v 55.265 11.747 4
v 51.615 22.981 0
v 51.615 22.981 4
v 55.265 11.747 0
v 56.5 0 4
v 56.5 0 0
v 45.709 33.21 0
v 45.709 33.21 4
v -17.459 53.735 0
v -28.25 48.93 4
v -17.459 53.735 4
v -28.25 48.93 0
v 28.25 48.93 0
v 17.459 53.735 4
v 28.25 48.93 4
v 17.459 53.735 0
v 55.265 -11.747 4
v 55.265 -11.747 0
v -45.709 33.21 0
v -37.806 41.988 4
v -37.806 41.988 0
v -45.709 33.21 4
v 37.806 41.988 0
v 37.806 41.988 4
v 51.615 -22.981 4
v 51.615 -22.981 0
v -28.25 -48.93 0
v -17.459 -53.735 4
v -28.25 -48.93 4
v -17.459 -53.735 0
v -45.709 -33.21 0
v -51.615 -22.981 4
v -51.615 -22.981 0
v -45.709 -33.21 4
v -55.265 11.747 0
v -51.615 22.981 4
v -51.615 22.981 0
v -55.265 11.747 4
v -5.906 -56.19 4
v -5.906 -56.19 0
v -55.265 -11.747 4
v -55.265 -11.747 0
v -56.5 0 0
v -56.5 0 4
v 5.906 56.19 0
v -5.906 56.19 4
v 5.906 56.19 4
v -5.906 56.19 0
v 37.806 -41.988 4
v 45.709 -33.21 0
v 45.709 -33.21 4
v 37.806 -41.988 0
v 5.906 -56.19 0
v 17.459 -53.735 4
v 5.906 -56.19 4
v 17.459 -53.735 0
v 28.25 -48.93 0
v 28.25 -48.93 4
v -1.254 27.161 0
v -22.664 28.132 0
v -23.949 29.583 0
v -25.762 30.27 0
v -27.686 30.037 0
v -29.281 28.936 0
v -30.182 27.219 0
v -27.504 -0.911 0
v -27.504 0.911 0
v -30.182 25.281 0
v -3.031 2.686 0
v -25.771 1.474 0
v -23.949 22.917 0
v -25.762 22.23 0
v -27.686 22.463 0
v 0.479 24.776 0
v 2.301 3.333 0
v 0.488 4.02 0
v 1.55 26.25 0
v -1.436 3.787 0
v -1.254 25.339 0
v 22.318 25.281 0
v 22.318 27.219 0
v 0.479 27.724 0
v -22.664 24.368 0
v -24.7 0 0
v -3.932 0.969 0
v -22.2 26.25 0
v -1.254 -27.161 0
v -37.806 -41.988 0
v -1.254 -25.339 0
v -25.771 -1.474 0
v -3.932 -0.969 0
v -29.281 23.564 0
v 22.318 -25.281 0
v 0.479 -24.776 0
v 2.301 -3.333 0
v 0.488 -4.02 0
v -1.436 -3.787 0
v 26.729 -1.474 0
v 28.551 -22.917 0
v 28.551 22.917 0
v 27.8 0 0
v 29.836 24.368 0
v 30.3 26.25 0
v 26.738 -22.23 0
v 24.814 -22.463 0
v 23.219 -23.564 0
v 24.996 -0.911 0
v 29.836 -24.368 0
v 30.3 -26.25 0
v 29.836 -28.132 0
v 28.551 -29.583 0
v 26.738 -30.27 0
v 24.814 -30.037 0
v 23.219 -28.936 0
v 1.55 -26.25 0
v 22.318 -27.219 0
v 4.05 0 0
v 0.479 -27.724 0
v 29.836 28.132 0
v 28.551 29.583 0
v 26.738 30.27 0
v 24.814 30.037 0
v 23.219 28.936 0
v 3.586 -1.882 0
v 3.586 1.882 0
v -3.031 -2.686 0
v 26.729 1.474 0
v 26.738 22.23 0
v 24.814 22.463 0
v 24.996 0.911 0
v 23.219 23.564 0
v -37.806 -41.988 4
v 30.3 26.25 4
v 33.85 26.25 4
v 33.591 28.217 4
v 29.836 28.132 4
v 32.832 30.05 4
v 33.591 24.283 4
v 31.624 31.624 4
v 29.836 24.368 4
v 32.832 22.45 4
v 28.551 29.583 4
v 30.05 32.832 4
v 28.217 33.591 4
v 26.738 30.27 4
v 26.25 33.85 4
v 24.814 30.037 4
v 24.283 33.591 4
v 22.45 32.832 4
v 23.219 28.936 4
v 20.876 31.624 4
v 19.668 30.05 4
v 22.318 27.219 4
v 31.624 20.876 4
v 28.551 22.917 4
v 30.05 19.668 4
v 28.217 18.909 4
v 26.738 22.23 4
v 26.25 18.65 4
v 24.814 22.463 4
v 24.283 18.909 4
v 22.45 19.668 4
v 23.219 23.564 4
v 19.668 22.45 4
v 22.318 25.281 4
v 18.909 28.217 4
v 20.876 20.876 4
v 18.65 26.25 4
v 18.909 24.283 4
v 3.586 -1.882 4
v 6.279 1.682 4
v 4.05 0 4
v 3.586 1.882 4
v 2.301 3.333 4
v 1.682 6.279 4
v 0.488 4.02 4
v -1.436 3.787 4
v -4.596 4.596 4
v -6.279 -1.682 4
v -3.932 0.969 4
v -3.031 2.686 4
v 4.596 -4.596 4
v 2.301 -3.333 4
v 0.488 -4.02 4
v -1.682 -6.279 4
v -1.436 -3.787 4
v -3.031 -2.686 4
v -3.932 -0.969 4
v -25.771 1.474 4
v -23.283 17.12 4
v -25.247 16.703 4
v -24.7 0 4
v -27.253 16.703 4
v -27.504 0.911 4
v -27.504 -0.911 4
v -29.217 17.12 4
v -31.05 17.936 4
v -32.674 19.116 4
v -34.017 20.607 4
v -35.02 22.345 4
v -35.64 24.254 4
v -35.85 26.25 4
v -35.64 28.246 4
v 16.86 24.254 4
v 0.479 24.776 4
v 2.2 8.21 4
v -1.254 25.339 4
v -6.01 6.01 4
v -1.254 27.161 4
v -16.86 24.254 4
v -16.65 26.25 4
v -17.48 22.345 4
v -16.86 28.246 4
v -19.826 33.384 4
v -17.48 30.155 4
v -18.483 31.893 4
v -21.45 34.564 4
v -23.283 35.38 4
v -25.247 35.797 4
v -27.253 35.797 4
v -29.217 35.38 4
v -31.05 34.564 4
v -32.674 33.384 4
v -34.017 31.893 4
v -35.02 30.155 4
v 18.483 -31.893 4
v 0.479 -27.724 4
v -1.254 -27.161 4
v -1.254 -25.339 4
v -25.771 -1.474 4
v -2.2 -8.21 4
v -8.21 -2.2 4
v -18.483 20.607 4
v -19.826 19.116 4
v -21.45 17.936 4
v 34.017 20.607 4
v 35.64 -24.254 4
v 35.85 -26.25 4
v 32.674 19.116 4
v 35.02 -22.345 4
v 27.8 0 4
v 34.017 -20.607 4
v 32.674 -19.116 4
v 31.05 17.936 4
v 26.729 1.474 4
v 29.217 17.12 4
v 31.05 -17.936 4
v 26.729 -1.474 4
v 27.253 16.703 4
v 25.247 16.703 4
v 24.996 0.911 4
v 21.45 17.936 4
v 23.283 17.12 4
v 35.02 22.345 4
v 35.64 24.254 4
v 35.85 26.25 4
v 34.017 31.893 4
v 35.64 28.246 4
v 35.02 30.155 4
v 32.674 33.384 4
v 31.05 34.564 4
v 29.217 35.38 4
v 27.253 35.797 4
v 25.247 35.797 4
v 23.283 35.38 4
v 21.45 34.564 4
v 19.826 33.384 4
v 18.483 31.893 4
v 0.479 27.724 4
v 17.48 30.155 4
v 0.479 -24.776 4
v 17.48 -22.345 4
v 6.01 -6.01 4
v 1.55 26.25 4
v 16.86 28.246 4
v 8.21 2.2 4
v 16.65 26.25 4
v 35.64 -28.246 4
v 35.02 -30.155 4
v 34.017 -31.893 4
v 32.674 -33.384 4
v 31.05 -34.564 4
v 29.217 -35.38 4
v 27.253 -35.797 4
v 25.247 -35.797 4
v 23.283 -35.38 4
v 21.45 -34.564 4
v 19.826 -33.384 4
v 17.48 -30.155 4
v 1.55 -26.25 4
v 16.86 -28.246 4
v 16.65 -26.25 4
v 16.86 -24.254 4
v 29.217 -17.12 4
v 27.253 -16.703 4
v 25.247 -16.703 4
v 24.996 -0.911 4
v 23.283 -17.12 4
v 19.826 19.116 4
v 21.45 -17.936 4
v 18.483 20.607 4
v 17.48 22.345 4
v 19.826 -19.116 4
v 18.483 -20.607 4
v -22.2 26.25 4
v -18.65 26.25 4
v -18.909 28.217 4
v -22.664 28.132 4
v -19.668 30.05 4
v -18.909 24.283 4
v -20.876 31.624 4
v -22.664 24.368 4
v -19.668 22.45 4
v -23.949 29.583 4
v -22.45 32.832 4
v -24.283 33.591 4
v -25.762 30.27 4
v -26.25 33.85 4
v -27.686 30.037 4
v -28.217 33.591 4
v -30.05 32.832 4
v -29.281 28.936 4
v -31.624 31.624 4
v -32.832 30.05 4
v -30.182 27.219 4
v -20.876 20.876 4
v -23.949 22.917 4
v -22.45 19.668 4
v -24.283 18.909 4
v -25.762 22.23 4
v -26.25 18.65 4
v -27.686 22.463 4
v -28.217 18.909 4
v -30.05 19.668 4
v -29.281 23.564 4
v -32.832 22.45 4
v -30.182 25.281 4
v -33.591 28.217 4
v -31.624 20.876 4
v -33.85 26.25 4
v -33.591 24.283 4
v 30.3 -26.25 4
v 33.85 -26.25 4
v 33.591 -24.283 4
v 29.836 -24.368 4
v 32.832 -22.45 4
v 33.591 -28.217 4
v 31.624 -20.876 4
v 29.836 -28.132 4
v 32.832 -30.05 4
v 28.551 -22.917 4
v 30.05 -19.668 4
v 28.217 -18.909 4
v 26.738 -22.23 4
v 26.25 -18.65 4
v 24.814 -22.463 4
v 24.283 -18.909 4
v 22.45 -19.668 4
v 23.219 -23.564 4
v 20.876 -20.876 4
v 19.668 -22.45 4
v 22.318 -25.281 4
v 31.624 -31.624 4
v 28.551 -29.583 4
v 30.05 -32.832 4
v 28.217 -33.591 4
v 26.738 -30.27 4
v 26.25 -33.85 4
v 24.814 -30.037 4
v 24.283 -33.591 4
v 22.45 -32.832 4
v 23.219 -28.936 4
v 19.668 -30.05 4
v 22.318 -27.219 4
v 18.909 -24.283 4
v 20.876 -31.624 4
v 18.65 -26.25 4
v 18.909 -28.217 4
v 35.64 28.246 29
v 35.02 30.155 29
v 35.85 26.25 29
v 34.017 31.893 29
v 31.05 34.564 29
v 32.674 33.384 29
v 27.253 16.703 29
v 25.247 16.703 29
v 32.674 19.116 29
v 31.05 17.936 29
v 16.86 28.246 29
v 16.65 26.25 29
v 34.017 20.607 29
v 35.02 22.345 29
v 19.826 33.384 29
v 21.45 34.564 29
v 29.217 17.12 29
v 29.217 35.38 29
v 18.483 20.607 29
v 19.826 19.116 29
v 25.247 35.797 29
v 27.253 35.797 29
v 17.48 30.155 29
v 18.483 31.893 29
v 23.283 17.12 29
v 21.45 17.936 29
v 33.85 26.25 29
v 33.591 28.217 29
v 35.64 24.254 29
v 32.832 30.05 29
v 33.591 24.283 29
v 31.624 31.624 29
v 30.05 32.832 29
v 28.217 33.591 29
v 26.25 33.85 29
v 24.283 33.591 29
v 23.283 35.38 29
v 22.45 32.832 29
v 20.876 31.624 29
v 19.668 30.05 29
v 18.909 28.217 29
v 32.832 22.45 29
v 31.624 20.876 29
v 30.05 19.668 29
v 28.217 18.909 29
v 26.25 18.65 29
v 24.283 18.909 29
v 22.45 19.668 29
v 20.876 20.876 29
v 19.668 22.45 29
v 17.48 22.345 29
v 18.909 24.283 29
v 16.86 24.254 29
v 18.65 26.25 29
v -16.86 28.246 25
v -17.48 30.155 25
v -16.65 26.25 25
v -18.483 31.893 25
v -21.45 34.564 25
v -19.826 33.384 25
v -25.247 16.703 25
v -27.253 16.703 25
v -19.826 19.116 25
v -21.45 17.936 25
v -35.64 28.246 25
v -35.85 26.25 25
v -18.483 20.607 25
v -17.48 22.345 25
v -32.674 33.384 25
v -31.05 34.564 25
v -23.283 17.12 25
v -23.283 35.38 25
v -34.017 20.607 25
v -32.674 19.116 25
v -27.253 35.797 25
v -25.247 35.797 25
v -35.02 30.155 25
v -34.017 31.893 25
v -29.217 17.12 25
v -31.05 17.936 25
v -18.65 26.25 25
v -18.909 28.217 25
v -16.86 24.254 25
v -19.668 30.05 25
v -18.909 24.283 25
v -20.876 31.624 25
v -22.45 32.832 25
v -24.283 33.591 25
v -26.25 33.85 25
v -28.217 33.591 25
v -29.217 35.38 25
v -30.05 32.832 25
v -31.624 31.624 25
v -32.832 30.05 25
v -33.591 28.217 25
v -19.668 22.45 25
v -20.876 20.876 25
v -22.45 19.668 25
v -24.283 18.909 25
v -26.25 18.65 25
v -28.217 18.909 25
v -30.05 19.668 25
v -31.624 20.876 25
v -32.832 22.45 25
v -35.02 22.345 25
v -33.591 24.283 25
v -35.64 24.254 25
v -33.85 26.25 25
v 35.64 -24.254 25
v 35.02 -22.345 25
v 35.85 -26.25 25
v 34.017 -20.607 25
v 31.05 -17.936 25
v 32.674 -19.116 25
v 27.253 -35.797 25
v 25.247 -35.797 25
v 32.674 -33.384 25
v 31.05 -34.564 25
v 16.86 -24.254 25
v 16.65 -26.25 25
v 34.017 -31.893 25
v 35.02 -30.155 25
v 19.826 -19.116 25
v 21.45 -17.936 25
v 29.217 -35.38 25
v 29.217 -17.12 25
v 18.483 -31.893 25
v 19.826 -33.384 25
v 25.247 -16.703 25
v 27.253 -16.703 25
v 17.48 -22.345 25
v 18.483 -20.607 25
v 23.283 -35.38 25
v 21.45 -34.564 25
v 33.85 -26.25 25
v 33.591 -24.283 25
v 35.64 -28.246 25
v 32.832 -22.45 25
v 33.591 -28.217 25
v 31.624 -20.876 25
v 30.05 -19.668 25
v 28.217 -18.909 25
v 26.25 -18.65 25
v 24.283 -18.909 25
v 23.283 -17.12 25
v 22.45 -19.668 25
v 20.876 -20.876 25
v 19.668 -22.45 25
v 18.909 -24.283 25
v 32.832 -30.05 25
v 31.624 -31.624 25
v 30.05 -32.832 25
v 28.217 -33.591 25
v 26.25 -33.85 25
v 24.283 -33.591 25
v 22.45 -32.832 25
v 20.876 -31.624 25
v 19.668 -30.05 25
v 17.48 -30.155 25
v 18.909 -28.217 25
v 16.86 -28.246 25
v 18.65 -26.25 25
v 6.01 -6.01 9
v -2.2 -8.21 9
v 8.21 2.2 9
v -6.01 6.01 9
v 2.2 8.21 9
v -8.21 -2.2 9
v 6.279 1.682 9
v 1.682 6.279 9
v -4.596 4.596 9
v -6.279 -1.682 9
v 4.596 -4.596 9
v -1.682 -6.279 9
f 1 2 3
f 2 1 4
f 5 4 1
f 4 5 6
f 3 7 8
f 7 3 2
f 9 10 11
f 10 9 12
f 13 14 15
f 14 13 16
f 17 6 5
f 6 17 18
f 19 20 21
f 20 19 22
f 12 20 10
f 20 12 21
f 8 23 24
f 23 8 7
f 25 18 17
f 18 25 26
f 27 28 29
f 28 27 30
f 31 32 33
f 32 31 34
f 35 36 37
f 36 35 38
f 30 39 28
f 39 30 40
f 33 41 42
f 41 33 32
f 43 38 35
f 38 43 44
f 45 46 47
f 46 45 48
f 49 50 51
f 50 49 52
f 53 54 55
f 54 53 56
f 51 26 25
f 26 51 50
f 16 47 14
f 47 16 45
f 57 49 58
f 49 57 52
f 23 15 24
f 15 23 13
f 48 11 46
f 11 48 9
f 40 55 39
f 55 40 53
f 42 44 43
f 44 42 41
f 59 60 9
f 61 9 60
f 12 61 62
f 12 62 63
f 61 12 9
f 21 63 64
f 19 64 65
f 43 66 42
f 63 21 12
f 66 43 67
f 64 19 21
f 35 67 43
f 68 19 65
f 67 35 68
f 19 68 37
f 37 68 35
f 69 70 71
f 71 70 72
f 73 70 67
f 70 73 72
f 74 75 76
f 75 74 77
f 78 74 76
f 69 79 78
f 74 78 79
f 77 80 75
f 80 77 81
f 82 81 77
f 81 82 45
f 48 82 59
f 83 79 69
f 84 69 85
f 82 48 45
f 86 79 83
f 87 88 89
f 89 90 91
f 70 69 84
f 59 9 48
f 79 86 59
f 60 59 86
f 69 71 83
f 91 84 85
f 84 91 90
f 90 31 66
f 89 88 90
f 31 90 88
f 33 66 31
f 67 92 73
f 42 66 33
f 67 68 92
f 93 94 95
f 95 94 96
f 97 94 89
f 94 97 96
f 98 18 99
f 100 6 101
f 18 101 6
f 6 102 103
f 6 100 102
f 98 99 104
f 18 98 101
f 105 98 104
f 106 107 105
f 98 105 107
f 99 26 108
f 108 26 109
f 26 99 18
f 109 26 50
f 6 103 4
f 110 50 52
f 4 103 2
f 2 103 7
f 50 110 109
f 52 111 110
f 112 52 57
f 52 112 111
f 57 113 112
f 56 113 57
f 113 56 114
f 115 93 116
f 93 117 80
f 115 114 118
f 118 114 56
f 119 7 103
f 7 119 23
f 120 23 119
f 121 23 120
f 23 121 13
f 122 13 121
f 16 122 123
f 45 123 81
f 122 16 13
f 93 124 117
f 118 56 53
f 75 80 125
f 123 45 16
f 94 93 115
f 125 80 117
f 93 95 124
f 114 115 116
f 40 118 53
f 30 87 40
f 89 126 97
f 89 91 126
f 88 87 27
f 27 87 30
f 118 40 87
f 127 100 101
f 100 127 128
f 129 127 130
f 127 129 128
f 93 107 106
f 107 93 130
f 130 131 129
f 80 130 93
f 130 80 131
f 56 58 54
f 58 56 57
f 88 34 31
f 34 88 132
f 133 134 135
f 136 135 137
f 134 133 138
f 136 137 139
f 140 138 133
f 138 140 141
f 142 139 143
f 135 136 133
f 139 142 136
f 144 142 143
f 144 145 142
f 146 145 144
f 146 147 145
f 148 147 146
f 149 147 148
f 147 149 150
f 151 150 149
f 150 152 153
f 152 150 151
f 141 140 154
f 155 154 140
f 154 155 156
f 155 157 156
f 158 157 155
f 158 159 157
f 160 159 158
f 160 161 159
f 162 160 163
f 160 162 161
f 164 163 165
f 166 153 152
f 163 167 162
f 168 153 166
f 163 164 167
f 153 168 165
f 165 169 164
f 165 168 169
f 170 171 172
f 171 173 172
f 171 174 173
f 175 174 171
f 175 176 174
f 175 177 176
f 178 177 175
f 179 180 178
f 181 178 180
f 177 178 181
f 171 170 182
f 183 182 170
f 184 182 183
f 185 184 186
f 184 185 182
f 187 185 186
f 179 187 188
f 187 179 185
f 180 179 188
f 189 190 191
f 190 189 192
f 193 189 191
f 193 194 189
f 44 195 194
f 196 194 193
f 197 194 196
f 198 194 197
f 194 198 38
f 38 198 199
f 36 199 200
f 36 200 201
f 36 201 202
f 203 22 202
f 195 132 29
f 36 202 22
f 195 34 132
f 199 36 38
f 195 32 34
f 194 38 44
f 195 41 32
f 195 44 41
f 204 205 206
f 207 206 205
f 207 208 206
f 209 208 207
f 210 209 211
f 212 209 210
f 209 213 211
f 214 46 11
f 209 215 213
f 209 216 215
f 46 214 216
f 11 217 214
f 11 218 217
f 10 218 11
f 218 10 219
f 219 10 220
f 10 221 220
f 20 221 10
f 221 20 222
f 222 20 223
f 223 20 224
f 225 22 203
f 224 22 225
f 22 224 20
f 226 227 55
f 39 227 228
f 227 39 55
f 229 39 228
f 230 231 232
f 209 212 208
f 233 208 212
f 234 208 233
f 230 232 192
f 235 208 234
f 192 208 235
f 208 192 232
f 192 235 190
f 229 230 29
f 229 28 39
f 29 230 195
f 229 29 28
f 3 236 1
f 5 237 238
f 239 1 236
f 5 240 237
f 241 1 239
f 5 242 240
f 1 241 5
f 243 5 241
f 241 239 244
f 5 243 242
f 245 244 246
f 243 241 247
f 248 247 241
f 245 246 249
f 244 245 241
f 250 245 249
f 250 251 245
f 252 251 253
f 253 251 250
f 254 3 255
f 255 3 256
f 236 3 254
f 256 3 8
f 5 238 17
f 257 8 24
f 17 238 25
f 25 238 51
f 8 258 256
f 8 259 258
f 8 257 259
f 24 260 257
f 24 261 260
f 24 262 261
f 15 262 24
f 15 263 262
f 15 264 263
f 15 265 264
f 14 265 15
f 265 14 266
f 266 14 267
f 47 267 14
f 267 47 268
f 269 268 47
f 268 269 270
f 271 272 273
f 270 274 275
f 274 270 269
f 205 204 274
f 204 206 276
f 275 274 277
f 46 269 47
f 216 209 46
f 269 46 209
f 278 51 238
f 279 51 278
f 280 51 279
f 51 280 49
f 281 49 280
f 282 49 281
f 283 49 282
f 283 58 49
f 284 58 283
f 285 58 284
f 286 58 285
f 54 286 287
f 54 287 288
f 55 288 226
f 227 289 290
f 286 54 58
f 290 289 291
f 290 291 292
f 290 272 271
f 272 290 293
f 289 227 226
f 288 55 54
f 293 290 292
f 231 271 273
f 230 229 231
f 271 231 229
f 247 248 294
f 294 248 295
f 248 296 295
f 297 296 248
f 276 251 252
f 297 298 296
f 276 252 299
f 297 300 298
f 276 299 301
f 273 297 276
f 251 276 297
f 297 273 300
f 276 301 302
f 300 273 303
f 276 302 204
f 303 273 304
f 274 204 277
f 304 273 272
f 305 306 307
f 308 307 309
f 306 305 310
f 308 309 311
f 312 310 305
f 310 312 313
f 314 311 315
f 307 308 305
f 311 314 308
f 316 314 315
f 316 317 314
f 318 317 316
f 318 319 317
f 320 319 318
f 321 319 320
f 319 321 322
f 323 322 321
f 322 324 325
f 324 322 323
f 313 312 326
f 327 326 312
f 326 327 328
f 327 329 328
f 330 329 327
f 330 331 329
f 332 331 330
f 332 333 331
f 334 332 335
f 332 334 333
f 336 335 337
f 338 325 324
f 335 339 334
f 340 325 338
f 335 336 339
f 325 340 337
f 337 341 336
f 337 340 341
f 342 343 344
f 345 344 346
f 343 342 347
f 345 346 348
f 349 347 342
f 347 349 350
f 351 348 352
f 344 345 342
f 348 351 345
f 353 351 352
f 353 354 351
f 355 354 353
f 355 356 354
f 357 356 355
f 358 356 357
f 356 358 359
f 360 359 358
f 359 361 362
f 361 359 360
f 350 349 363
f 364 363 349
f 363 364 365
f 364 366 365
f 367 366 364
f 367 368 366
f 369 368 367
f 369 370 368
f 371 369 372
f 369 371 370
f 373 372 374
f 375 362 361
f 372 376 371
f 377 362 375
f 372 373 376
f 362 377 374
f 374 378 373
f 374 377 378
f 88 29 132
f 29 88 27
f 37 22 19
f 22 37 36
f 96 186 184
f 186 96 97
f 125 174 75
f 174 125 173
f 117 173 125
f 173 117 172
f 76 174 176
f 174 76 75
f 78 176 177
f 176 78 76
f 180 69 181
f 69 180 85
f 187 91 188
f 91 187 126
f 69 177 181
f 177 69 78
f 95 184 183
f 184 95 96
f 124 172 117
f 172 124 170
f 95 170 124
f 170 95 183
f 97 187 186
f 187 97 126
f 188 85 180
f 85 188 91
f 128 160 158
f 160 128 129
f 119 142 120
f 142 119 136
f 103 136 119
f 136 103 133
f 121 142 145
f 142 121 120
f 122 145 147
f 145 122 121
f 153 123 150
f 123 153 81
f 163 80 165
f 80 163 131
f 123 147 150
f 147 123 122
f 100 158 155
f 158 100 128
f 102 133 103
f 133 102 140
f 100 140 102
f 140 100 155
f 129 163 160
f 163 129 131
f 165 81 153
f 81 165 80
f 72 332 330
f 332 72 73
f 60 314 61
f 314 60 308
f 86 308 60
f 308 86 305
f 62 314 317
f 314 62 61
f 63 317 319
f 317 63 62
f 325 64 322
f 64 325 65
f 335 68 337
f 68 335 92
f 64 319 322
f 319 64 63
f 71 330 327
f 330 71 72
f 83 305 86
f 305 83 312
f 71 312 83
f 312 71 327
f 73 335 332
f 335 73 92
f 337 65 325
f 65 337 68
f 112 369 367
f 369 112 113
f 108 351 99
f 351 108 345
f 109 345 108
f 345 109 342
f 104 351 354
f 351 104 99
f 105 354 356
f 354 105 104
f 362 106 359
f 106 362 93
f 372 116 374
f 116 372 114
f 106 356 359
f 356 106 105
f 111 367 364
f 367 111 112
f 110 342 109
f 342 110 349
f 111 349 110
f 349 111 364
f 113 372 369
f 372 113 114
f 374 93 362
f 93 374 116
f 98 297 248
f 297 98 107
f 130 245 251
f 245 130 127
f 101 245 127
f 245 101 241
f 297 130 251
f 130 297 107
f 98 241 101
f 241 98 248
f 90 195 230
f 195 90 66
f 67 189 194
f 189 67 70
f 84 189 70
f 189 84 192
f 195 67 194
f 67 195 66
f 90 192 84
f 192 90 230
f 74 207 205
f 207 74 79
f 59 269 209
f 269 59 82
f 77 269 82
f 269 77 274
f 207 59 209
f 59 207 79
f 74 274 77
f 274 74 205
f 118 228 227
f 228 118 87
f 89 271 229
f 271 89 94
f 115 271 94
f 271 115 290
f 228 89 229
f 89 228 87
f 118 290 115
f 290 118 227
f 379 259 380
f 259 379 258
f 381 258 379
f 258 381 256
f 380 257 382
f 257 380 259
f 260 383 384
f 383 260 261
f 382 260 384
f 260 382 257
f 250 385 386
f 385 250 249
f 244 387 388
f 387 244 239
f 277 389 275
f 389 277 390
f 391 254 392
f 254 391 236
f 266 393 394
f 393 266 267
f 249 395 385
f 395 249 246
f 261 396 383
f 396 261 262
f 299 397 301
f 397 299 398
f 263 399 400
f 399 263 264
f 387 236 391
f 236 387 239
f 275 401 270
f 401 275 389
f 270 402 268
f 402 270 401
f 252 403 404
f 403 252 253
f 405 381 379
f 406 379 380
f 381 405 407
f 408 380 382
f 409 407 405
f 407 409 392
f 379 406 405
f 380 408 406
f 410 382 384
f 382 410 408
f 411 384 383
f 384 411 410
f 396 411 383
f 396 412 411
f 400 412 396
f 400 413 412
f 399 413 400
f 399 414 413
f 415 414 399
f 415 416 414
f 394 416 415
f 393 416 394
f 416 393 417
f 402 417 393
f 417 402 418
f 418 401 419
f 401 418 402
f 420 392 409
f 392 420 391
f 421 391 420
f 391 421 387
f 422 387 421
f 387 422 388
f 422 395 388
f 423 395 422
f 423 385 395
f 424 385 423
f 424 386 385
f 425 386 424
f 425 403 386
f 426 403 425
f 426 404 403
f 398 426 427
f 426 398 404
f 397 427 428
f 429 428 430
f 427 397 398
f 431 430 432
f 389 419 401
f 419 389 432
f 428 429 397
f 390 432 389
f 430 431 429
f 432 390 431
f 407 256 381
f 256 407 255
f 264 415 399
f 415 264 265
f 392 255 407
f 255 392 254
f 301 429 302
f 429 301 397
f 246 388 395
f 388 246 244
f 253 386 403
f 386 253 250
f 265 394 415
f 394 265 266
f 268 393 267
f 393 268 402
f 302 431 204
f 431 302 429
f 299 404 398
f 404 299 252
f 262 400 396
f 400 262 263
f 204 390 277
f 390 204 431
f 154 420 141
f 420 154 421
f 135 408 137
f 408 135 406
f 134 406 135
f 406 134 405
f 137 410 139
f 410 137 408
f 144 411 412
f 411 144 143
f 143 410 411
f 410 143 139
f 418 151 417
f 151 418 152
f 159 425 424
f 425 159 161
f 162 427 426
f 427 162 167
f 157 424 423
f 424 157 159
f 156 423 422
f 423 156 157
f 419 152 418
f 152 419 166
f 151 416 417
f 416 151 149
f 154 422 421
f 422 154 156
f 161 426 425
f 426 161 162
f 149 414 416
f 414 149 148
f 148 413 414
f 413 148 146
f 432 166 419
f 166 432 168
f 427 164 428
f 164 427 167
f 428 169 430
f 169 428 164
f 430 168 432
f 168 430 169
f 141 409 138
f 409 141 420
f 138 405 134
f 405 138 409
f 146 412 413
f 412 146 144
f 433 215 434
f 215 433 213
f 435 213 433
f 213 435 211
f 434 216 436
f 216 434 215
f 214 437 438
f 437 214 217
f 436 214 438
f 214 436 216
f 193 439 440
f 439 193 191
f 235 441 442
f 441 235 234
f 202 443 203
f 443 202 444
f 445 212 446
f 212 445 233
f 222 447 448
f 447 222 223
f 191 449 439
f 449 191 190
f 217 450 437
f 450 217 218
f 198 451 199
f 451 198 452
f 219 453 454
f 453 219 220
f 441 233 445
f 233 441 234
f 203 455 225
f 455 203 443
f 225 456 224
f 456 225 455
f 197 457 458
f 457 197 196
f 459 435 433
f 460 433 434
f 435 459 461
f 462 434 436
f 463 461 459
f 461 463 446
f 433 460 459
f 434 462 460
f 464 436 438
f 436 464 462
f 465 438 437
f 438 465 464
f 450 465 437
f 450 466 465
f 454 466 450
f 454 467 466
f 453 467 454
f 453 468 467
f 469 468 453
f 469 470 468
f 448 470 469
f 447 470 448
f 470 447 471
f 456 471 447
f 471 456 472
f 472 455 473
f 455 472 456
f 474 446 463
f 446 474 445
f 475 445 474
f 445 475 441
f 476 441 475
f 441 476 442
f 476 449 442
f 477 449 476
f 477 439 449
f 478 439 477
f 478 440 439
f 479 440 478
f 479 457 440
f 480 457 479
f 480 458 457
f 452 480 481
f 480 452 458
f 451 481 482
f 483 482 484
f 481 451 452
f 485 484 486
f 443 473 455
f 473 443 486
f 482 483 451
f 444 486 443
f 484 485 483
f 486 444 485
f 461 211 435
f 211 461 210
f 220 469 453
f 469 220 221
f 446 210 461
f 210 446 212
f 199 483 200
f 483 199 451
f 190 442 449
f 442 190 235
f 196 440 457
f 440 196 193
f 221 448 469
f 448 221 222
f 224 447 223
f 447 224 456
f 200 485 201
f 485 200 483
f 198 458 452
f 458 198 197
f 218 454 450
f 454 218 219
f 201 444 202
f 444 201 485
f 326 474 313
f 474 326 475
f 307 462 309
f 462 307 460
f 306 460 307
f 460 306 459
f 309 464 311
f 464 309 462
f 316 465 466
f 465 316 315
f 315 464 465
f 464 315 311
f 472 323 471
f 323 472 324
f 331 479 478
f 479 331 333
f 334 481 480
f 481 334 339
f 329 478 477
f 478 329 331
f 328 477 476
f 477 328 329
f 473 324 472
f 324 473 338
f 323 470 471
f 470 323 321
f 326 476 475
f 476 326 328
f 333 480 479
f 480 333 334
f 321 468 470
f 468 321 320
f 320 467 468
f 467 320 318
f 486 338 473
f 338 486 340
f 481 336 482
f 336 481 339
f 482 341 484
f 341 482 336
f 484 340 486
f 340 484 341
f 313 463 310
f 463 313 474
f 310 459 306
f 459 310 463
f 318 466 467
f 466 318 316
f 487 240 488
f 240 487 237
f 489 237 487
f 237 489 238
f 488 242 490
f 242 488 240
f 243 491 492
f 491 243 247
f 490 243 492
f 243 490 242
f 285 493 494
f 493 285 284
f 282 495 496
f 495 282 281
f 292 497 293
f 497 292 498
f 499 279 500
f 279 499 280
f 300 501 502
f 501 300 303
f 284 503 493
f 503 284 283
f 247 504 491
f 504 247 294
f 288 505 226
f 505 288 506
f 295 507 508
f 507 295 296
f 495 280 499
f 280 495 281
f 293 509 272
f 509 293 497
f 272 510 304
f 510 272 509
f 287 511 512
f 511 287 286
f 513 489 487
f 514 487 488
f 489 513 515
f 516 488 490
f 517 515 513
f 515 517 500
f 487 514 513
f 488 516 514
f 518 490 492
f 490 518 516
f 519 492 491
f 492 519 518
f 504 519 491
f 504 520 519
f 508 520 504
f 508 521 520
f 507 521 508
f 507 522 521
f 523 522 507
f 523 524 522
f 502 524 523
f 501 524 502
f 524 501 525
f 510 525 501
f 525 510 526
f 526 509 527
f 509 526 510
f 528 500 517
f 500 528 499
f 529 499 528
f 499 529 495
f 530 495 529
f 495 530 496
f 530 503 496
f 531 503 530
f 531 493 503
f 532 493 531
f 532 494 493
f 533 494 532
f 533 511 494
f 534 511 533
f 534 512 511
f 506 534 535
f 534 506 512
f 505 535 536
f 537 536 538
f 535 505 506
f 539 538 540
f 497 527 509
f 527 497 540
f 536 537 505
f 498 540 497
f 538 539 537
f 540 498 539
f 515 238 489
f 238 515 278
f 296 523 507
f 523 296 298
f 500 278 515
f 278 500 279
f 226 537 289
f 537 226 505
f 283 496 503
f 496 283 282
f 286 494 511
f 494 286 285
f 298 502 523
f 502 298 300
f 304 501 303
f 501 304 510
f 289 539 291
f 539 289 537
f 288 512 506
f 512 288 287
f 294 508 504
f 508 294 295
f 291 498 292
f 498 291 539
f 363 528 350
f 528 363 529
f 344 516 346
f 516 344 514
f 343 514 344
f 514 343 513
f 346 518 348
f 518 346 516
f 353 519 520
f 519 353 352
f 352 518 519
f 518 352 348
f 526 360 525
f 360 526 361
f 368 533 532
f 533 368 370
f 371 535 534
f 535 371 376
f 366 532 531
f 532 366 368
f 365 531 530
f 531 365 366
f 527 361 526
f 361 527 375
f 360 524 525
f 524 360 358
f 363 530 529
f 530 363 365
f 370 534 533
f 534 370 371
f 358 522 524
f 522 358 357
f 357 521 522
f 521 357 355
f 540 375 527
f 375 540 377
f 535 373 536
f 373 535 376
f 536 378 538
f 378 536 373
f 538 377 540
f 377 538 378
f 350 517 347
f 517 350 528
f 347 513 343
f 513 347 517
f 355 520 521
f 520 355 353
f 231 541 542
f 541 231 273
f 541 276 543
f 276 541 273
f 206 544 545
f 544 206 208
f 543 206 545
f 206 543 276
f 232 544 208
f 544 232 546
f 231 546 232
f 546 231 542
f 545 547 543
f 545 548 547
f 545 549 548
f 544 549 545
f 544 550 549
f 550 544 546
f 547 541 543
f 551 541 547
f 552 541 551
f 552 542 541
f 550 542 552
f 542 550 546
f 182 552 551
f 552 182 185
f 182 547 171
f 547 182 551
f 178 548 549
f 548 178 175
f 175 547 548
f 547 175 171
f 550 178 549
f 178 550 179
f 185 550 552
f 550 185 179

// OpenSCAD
echo(version=version());

// units in mm
BASE_WIDTH = 113.0;
BASE_HEIGHT = 53.0;
BASE_WALL = 4.0;
INNER_RIDGE_HEIGHT = 6.0;
INNER_RIDGE_WIDTH = 2.0;

PLATFORM_WIDTH = 100.0;
PLATFORM_HEIGHT = 4.0;

SUPPORT_WIDTH = BASE_WIDTH - INNER_RIDGE_WIDTH * 4;
SUPPORT_HEIGHT = 20.0;

ROD_WIDTH = 8.1; // m8 
ROD_DEPTH = 10.0;
ROD_PLACEMENT = (BASE_WIDTH - INNER_RIDGE_WIDTH * 4) / 4;

BEARING_HEIGHT = 25.0;
BEARING_WIDTH = 15.2;
ROD_SHAFT_HEIGHT = BEARING_HEIGHT;
ROD_SHAFT_WIDTH = BEARING_WIDTH + 4;

STEPPER_ROD_NUT_WIDTH = 13.0;
STEPPER_ROD_HEIGHT = 5.0;
STEPPER_ROD_NUT_WALL = STEPPER_ROD_NUT_WIDTH + 4;

// stepper dims
STEPPER_WIDTH = 42.3;
STEPPER_HEIGHT = 33.0;
STEPPER_SCREW_SPACE = 31.0; 
STEPPER_HALF_SPACE = STEPPER_SCREW_SPACE / 2;
STEPPER_SCREW_SIZE = 3.1; // m3
STEPPER_SHAFT = 7.0;

SUPPORT_HEIGHT = 20.0;

RISER_HEIGHT = 4.0;

ROD_WIDTH = 8.1; // m8 
ROD_DEPTH = 10.0;

ACCESS_HOLE_WIDTH = 20;
ACCESS_HOLE_Z_OFFSET = 20;

// top shelf
difference() {
    cylinder(h=RISER_HEIGHT, d=BASE_WIDTH);

    // stepper shaft
    cylinder(h=PLATFORM_HEIGHT, d=ROD_WIDTH);
    
    // support rods
    translate([ROD_PLACEMENT, ROD_PLACEMENT, 0])
        cylinder(h=ROD_DEPTH, d=ROD_WIDTH);
    translate([-1 * ROD_PLACEMENT, ROD_PLACEMENT, 0])
        cylinder(h=ROD_DEPTH, d=ROD_WIDTH);
    translate([ROD_PLACEMENT, -1 * ROD_PLACEMENT, 0])
        cylinder(h=ROD_DEPTH, d=ROD_WIDTH);
    
    // bottom/top connections
    translate([ROD_PLACEMENT, 0, 0])
        cylinder(h=PLATFORM_HEIGHT, d=STEPPER_SCREW_SIZE);
    translate([-1 * ROD_PLACEMENT, 0, 0])
        cylinder(h=PLATFORM_HEIGHT, d=STEPPER_SCREW_SIZE);
    translate([0, ROD_PLACEMENT, 0])
        cylinder(h=PLATFORM_HEIGHT, d=STEPPER_SCREW_SIZE);
    translate([0, -1 * ROD_PLACEMENT, 0])
        cylinder(h=PLATFORM_HEIGHT, d=STEPPER_SCREW_SIZE);
}

// rod support + bearing housing
translate([0, 0, PLATFORM_HEIGHT])
    translate([ROD_PLACEMENT, ROD_PLACEMENT, 0])
        difference() {
            cylinder(h=ROD_SHAFT_HEIGHT, d=ROD_SHAFT_WIDTH);
            cylinder(h=ROD_SHAFT_HEIGHT, d=BEARING_WIDTH);
        }
        
    translate([-1 * ROD_PLACEMENT, ROD_PLACEMENT, 0])
        difference() {
            cylinder(h=ROD_SHAFT_HEIGHT, d=ROD_SHAFT_WIDTH);
            cylinder(h=ROD_SHAFT_HEIGHT, d=BEARING_WIDTH);
        }
        
    translate([ROD_PLACEMENT, -1 * ROD_PLACEMENT, 0])
        difference() {
            cylinder(h=ROD_SHAFT_HEIGHT, d=ROD_SHAFT_WIDTH);
            cylinder(h=ROD_SHAFT_HEIGHT, d=BEARING_WIDTH);
        }
        
 // m8 stepper rod
 translate([0, 0, PLATFORM_HEIGHT])
 rotate([0, 0, 15])
     difference() {
        cylinder($fn=6, h=STEPPER_ROD_HEIGHT, d=STEPPER_ROD_NUT_WALL);
        cylinder($fn=6, h=STEPPER_ROD_HEIGHT, d=STEPPER_ROD_NUT_WIDTH);
     }
  
